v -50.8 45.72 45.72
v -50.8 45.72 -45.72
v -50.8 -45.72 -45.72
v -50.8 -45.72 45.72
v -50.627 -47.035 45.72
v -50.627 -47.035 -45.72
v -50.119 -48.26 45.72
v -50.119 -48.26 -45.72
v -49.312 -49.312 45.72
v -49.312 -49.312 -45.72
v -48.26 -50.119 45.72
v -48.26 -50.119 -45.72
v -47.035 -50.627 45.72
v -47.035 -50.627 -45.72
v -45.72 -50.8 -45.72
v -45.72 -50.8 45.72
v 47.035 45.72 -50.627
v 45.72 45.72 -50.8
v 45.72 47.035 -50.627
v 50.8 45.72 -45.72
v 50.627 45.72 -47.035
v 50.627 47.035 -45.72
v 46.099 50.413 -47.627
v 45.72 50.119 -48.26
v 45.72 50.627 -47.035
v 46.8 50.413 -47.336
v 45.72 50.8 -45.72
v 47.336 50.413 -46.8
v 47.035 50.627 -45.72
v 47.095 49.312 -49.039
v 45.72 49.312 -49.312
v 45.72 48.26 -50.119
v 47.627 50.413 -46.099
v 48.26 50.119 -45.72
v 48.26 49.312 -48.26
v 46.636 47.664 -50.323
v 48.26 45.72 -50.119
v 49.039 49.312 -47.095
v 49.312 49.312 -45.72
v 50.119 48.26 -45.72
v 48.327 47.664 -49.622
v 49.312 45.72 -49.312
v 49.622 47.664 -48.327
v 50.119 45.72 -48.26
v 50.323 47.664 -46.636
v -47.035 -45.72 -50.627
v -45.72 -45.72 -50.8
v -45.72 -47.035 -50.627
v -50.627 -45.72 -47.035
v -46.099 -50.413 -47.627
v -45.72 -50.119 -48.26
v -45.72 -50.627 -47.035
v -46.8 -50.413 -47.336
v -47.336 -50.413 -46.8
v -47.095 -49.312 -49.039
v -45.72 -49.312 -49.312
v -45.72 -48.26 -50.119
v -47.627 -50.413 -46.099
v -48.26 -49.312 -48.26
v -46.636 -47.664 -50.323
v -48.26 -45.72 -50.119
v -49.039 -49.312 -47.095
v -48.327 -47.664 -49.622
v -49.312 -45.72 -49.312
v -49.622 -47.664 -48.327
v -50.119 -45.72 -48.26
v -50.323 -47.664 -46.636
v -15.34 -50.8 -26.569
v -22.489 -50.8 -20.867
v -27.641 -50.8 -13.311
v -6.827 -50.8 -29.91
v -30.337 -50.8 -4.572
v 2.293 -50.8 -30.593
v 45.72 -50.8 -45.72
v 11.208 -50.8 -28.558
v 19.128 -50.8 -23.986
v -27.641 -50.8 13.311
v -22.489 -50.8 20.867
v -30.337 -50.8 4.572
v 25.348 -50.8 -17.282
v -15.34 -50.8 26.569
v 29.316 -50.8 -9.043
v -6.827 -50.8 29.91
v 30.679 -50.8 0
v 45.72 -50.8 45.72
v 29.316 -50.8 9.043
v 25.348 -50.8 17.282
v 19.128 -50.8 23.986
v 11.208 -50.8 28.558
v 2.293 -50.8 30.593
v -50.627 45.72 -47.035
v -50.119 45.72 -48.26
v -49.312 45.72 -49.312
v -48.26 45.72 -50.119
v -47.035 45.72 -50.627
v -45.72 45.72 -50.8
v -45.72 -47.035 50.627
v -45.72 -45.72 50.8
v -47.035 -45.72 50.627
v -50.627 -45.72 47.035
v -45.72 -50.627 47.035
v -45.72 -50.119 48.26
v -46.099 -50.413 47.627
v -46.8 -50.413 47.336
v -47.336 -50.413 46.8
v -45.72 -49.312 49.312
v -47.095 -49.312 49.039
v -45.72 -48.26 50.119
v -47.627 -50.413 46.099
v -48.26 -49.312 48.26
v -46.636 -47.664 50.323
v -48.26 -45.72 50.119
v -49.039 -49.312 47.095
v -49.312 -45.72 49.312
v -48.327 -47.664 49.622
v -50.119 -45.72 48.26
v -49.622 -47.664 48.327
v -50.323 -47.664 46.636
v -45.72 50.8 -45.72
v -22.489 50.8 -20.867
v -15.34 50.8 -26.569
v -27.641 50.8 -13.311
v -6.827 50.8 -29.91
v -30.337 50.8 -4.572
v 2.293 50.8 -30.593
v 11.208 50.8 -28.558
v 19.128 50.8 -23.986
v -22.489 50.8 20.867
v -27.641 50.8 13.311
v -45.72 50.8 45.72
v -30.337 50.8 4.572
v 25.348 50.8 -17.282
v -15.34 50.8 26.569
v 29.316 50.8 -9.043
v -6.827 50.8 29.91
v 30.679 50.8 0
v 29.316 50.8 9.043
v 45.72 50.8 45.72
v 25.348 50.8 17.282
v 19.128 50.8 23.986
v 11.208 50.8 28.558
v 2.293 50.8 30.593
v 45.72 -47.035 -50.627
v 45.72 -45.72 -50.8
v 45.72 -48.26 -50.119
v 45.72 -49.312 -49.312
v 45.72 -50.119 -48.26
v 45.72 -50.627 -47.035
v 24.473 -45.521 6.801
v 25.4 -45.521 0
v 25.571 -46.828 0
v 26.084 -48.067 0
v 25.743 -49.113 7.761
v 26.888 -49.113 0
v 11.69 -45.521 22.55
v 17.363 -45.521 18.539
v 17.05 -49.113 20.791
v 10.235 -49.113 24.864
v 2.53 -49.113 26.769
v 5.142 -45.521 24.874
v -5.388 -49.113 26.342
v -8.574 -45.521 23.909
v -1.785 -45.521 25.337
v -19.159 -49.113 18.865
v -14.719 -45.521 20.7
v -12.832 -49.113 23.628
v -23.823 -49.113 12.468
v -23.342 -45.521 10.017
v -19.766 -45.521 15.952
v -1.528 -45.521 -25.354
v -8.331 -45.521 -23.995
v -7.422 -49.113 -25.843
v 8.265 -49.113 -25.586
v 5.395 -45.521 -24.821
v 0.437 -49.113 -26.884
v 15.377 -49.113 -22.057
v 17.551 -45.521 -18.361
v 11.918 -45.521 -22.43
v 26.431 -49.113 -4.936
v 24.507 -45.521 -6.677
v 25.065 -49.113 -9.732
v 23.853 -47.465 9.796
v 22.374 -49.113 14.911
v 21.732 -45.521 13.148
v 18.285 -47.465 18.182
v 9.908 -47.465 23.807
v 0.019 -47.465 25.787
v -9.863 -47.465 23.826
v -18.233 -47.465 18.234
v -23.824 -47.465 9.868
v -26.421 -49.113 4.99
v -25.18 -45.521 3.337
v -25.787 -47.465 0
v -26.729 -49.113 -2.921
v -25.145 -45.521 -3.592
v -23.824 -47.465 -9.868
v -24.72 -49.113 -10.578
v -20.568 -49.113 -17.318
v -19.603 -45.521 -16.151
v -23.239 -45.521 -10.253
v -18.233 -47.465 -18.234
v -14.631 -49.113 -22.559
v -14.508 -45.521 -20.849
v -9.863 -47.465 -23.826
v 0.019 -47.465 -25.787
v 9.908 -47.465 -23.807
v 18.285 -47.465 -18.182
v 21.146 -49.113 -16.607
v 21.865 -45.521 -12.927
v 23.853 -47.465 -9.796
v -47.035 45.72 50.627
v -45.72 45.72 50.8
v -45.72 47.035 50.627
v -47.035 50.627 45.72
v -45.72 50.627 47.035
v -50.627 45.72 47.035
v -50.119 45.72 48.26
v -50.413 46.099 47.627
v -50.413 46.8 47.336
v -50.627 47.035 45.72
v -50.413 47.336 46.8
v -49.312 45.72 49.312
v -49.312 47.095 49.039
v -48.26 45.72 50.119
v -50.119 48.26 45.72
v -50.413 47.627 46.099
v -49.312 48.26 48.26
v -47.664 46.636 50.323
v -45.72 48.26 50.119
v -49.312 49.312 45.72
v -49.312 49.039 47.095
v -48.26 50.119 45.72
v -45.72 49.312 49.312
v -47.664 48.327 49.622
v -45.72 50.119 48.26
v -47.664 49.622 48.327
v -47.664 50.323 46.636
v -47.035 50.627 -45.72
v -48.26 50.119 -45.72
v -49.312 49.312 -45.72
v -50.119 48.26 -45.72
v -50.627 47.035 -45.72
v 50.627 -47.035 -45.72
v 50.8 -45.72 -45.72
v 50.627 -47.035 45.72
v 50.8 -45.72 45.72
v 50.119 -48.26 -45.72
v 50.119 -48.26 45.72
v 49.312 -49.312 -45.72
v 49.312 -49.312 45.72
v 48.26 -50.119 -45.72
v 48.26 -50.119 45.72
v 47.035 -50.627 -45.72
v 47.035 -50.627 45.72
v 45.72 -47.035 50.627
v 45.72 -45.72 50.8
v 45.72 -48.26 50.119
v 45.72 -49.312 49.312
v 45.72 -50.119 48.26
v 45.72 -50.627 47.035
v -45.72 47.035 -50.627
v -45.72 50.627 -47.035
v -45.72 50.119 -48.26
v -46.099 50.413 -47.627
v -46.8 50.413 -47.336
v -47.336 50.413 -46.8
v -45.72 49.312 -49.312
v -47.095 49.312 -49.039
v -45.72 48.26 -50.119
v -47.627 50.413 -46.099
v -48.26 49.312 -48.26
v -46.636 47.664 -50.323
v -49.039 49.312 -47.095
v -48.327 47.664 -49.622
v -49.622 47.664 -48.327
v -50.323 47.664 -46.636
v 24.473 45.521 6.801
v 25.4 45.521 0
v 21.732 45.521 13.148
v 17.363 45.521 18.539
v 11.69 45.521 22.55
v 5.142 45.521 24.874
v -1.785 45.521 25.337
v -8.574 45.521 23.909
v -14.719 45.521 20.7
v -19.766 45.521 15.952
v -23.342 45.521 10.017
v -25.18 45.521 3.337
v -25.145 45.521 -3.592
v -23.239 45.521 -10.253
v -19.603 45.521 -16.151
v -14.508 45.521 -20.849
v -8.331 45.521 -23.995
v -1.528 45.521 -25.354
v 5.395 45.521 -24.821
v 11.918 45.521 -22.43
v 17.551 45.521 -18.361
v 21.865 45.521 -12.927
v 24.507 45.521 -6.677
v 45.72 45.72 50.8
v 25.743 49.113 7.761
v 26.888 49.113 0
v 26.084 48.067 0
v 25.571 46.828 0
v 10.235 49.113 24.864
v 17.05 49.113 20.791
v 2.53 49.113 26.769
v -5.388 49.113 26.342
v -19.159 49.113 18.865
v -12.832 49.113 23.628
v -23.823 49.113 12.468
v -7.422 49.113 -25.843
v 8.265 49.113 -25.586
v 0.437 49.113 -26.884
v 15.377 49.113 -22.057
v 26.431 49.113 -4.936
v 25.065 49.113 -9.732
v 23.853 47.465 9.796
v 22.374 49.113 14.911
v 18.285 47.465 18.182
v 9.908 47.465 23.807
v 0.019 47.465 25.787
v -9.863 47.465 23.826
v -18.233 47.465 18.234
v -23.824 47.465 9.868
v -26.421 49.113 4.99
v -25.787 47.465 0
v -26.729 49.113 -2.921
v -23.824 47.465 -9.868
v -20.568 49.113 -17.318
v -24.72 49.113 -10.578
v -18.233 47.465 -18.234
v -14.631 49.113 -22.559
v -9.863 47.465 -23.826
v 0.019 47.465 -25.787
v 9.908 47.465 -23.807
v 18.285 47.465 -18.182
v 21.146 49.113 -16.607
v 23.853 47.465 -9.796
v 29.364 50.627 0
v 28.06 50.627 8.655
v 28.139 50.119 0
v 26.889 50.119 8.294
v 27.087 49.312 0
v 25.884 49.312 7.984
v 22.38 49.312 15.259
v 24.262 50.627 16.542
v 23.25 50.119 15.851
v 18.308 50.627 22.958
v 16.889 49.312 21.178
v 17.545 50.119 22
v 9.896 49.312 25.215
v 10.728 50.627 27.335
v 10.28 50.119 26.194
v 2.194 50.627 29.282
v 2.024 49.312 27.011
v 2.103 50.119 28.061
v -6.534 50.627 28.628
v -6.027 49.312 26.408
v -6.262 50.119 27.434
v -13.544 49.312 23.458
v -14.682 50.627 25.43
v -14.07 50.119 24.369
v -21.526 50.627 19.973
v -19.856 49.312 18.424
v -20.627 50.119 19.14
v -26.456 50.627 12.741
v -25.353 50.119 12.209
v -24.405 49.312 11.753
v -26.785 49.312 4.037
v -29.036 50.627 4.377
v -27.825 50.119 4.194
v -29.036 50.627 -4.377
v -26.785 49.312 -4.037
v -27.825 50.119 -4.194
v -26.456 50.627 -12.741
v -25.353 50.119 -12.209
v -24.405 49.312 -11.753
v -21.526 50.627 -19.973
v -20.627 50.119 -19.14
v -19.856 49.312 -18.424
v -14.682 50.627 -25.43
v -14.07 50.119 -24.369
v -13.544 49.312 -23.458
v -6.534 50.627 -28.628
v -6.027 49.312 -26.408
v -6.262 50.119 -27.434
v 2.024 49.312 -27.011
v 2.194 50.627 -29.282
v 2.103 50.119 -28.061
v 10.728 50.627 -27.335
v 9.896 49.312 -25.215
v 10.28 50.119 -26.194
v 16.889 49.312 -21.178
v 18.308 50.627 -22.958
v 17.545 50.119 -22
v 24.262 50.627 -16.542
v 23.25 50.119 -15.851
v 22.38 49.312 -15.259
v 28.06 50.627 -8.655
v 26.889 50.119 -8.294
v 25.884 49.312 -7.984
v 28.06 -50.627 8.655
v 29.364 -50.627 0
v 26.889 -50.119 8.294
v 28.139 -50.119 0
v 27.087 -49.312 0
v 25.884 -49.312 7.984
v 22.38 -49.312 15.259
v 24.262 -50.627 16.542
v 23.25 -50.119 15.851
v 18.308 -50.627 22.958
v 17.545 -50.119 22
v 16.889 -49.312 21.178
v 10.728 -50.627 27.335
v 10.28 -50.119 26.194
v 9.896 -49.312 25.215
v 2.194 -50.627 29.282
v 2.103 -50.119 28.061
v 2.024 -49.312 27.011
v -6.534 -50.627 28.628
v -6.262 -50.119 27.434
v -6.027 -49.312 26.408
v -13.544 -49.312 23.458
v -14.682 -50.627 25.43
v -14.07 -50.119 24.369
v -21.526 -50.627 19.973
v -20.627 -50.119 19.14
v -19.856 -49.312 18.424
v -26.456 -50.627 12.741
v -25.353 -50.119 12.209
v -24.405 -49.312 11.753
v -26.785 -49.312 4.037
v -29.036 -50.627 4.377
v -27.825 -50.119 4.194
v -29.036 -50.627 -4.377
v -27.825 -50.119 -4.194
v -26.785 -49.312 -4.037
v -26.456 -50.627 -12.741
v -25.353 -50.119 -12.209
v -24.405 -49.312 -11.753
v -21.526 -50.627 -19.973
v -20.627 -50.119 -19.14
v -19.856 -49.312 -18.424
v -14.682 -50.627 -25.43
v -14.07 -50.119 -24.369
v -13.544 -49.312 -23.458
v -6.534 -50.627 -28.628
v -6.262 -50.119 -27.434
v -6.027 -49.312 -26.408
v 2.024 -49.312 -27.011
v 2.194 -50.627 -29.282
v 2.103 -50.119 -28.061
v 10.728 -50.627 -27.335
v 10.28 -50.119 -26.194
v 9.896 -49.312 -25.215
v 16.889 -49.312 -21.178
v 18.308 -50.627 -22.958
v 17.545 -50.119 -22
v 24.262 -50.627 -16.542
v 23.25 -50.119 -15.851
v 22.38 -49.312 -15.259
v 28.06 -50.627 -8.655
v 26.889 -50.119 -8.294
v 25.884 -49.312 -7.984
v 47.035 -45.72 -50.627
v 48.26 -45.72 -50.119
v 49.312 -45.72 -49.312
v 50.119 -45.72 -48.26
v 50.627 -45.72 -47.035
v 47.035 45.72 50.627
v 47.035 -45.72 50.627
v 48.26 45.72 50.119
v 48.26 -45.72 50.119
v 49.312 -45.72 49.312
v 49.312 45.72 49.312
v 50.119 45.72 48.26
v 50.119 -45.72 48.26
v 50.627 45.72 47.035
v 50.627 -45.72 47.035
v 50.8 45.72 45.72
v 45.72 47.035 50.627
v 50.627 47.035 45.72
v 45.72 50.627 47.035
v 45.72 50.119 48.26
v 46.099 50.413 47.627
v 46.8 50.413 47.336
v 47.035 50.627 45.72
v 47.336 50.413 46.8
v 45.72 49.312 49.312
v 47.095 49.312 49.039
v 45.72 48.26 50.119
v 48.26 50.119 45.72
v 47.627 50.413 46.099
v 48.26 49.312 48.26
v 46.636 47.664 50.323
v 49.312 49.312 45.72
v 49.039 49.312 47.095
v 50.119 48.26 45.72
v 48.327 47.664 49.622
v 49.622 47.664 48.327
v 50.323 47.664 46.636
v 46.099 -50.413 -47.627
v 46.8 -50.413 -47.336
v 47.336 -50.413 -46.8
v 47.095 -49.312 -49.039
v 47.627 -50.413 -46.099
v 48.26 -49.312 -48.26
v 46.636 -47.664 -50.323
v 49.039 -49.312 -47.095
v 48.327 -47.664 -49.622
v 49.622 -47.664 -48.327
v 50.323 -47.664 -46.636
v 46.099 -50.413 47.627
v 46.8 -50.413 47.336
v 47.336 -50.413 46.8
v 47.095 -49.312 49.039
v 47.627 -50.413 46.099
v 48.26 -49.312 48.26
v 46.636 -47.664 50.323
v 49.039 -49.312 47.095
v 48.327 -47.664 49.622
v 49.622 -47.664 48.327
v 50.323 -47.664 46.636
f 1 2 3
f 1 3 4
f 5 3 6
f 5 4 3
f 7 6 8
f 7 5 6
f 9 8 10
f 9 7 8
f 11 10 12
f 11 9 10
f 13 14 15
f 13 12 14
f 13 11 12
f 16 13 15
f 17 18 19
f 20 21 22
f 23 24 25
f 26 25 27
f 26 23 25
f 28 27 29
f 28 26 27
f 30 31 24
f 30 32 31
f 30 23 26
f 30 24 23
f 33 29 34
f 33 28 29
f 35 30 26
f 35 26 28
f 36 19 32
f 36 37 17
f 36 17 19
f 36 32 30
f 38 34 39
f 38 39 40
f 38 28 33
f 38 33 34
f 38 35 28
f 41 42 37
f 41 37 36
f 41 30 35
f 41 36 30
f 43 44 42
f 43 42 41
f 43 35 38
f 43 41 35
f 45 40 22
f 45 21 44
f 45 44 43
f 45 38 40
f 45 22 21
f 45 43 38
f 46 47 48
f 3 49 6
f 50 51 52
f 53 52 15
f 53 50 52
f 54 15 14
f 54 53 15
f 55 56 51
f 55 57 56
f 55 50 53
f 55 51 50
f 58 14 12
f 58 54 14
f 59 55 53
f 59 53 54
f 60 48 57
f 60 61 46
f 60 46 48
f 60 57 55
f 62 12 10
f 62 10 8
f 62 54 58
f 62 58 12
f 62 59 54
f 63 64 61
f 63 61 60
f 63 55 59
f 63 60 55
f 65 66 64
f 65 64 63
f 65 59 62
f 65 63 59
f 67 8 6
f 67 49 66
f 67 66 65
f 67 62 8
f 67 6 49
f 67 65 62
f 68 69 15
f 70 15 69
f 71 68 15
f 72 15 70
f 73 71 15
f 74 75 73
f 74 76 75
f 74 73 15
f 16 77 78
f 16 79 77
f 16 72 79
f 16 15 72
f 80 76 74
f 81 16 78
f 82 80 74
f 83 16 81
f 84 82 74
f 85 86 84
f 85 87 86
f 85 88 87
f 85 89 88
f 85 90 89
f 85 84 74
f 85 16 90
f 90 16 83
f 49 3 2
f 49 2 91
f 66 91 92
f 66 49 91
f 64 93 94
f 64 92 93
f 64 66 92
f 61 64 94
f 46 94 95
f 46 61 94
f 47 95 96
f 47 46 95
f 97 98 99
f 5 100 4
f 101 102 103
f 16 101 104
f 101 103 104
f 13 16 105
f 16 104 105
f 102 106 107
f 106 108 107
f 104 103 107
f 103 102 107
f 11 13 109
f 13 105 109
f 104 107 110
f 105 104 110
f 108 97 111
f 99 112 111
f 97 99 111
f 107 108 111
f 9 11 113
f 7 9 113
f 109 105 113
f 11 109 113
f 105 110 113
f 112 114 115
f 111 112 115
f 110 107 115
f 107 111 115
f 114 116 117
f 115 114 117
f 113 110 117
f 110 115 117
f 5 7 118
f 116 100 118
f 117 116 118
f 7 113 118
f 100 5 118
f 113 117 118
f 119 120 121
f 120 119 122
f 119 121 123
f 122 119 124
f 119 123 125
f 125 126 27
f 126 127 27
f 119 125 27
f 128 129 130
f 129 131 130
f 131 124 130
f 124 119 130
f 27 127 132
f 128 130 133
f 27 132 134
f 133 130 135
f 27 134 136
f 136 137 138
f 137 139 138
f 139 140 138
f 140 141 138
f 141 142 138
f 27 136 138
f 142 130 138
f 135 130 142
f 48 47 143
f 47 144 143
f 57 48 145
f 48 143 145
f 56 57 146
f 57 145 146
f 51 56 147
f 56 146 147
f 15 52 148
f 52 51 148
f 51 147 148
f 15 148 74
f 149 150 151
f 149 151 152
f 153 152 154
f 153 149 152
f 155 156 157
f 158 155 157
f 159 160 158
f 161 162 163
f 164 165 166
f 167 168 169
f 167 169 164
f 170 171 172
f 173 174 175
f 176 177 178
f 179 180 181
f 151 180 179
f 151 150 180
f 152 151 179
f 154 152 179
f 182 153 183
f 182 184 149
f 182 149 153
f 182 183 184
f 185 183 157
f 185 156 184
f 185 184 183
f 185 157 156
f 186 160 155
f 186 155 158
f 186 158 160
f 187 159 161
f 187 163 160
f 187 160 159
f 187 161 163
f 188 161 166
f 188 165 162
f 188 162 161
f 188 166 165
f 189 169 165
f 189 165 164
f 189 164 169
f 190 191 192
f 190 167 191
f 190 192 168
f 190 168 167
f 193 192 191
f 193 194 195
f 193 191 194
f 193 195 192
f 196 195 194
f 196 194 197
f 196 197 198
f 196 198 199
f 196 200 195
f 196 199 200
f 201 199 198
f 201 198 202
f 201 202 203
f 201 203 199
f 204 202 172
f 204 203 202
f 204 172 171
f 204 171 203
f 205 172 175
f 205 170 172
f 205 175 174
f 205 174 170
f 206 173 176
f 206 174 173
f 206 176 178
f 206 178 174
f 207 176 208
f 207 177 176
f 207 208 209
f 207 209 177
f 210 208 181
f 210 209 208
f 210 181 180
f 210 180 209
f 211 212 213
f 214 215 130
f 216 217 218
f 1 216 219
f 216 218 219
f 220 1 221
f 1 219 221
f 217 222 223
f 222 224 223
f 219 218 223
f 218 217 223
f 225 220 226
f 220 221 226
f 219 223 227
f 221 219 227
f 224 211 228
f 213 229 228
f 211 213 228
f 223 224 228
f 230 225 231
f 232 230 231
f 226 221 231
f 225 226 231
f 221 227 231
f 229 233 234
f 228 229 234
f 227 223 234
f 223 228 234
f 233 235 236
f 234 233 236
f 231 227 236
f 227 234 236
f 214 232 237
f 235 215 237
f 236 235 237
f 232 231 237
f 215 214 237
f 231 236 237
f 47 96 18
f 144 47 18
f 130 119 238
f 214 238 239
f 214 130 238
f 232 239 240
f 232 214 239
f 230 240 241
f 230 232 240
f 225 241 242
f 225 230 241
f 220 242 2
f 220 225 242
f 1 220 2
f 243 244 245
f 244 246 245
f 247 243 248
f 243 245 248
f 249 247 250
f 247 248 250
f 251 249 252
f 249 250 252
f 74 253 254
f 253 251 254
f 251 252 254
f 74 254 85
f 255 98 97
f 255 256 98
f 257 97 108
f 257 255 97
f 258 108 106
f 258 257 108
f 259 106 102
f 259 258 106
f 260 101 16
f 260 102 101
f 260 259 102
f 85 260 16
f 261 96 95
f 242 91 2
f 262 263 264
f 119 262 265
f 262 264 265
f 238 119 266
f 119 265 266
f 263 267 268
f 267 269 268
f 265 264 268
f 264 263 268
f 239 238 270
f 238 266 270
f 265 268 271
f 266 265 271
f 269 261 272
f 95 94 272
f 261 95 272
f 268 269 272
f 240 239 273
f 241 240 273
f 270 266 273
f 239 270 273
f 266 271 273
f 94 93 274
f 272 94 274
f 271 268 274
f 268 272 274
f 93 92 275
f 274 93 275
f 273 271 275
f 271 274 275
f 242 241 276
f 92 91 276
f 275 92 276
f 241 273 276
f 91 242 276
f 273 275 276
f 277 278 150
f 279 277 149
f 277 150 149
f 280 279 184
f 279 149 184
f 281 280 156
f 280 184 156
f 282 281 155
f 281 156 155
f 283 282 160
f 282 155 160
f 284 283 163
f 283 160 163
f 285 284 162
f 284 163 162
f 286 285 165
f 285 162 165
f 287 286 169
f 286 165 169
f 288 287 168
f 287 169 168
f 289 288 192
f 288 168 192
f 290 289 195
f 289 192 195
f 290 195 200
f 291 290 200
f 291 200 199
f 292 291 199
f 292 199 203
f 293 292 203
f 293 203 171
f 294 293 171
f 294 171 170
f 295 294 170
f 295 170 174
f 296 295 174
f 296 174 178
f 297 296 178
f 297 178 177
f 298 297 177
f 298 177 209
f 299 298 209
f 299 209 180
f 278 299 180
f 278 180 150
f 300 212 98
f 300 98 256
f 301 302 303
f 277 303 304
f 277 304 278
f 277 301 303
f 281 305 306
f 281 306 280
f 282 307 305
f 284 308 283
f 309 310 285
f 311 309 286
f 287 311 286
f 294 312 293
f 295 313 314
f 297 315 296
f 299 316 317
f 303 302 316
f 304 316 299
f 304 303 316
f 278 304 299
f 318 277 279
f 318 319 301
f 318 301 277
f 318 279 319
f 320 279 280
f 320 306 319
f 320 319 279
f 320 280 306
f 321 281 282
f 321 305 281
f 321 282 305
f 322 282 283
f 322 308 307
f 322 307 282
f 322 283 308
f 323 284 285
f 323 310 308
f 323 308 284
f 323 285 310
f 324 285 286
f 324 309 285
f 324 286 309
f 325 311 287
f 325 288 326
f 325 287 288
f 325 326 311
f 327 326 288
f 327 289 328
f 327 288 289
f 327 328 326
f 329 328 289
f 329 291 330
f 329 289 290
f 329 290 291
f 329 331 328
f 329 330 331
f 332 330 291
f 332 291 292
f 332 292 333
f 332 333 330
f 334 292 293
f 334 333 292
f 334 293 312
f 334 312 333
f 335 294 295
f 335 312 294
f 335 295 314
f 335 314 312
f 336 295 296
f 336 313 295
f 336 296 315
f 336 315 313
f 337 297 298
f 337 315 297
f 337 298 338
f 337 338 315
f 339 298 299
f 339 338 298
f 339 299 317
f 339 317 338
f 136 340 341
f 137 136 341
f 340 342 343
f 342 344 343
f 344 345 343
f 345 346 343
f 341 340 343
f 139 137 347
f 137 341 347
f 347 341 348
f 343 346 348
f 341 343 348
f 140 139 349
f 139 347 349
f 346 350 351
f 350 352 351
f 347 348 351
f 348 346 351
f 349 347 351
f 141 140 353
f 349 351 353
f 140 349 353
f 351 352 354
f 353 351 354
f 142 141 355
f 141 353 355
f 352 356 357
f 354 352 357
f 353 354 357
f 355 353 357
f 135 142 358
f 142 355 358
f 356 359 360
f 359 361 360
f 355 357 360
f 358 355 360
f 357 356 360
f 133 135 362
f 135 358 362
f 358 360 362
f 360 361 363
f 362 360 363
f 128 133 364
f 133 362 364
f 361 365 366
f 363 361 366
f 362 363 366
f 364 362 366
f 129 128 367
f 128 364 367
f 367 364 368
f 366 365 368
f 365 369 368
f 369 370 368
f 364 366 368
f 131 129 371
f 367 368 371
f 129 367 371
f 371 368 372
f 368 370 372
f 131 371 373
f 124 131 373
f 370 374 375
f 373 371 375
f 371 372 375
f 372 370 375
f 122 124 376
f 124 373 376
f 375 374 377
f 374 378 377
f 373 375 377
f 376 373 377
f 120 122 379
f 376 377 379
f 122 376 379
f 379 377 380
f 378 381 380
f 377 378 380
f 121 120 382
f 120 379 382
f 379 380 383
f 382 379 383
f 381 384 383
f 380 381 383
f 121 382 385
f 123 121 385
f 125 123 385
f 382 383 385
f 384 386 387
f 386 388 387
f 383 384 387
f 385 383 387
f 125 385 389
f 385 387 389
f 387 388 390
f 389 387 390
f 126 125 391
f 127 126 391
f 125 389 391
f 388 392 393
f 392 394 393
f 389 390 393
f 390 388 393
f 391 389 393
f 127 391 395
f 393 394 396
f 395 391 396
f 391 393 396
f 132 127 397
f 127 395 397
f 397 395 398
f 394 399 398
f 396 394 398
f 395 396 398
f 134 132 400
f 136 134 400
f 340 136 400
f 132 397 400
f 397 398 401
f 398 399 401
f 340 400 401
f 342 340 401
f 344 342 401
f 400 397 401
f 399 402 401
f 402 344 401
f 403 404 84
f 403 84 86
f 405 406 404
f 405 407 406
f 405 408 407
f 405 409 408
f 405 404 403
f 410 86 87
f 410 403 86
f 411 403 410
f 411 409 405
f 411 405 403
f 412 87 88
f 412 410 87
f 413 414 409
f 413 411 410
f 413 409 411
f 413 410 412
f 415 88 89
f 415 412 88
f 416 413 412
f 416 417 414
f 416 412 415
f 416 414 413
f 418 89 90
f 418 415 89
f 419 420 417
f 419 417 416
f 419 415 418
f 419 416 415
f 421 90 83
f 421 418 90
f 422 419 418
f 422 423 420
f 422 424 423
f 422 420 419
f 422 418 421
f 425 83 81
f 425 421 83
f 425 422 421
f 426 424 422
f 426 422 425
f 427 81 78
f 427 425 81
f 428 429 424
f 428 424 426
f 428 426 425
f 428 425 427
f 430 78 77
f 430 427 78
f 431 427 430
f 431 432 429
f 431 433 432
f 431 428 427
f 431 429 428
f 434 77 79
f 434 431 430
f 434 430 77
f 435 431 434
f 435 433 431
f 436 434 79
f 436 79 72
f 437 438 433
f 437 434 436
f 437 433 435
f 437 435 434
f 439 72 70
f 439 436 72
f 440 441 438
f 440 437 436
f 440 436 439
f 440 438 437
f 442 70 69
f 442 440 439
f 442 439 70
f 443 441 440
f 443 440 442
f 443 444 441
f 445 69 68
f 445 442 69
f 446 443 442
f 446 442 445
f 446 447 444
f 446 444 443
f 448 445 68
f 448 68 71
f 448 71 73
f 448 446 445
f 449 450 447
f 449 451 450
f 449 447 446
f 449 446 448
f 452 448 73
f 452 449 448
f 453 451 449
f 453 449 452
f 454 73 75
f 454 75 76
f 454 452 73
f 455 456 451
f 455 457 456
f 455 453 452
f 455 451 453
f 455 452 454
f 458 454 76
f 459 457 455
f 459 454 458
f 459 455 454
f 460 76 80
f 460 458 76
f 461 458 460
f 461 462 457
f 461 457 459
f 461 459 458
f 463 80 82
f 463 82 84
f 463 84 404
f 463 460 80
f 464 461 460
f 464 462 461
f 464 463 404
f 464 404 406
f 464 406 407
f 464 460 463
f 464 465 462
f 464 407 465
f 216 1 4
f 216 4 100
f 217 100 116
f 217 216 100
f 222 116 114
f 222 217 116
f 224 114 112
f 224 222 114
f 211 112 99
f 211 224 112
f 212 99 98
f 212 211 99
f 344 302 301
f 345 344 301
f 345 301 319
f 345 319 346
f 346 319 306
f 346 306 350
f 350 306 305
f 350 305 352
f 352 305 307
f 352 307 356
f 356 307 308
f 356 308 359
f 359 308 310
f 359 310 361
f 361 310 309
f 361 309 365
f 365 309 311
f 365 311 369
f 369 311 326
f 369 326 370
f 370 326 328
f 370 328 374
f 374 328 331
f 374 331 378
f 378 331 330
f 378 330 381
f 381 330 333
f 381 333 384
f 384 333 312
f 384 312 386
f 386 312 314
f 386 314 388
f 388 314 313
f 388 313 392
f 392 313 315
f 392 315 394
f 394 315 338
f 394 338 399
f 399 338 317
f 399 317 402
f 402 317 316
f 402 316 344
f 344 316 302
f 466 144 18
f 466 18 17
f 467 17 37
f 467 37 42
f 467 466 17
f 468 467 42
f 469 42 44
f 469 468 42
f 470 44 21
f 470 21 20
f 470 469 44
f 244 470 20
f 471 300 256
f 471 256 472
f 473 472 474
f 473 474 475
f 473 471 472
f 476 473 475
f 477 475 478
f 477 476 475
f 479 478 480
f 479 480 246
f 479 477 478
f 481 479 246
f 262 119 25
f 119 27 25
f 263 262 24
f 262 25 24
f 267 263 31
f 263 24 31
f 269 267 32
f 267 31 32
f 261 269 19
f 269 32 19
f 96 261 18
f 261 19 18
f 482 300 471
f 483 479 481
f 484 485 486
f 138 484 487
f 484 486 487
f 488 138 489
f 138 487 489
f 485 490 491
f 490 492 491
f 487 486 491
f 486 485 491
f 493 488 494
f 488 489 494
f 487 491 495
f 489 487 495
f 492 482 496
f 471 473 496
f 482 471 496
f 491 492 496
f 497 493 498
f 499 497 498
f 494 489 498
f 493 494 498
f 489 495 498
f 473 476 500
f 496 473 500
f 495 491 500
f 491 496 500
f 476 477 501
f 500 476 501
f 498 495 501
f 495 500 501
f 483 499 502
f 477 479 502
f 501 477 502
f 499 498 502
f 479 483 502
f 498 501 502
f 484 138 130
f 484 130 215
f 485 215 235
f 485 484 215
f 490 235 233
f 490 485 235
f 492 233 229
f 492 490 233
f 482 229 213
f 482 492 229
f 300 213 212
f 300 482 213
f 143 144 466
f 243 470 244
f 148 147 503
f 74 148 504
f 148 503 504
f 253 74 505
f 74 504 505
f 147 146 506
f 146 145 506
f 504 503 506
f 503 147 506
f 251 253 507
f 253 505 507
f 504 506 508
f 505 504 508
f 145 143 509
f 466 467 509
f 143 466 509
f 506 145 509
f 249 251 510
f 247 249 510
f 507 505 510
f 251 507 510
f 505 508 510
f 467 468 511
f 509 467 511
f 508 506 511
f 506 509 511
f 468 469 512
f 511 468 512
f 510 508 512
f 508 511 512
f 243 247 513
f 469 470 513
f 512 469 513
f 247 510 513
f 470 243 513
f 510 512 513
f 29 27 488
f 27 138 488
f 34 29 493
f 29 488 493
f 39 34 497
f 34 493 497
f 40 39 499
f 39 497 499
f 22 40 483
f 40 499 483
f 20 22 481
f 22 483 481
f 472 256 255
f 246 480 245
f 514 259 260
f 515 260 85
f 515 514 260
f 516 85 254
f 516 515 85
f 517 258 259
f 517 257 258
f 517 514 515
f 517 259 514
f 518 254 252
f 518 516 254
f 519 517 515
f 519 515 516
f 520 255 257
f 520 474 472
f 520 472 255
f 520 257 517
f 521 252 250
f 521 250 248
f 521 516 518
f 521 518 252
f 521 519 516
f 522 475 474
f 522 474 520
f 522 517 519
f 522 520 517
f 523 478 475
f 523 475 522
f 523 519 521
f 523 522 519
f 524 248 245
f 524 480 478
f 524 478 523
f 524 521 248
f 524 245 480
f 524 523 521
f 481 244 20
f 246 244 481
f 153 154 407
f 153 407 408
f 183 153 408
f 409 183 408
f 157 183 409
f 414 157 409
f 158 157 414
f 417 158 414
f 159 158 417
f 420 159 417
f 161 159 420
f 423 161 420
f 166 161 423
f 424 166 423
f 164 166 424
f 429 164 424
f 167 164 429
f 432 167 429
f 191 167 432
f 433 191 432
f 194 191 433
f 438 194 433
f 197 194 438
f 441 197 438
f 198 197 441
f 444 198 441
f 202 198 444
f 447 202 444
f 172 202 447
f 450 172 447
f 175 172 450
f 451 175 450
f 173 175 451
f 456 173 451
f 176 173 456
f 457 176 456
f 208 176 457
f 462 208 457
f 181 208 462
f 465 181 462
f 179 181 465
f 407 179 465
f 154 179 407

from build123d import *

# Parameters (mm, degrees)
F0_W     = 101.6
F0_H     = 101.6
F1_DEPTH = 50.8
F2_R     = 25.4
F3_DEPTH = 101.601
F4_SIZE  = 3.175
F5_R     = 5.08


with BuildPart() as f1:
    # F0 (on Front) → F1 (new body, symmetric)
    with BuildSketch(Plane.XZ):
        Rectangle(F0_W, F0_H)
    extrude(amount=F1_DEPTH, both=True)

    # F2 (on face) → F3 (cut, through all)
    with BuildSketch(Plane.XZ.offset(50.8)):
        Circle(F2_R)
    extrude(amount=-F3_DEPTH, mode=Mode.SUBTRACT)

    # F4
    f4_edges = [f1.edges().sort_by_distance(p)[0] for p in [
        (-25.4, -50.8, 0),
        (-25.4, 50.8, 0),
    ]]
    chamfer(f4_edges, length=F4_SIZE)

    # F5
    f5_edges = [f1.edges().sort_by_distance(p)[0] for p in [
        (50.8, 0, -50.8),
        (50.8, 0, 50.8),
        (0, 50.8, 50.8),
        (-50.8, 0, 50.8),
        (0, -50.8, 50.8),
        (-50.8, 0, -50.8),
        (0, 50.8, -50.8),
        (0, -50.8, -50.8),
        (-50.8, 50.8, 0),
        (-50.8, -50.8, 0),
        (50.8, 50.8, 0),
        (50.8, -50.8, 0),
        (26.9875, 49.2125, 0),
        (-28.575, 50.8, 0),
        (-25.4, 47.625, 0),
        (25.4, 0, 0),
        (-25.4, -47.625, 0),
        (26.9875, -49.2125, 0),
        (-28.575, -50.8, 0),
    ]]
    fillet(f5_edges, radius=F5_R)


solid = f1.part
